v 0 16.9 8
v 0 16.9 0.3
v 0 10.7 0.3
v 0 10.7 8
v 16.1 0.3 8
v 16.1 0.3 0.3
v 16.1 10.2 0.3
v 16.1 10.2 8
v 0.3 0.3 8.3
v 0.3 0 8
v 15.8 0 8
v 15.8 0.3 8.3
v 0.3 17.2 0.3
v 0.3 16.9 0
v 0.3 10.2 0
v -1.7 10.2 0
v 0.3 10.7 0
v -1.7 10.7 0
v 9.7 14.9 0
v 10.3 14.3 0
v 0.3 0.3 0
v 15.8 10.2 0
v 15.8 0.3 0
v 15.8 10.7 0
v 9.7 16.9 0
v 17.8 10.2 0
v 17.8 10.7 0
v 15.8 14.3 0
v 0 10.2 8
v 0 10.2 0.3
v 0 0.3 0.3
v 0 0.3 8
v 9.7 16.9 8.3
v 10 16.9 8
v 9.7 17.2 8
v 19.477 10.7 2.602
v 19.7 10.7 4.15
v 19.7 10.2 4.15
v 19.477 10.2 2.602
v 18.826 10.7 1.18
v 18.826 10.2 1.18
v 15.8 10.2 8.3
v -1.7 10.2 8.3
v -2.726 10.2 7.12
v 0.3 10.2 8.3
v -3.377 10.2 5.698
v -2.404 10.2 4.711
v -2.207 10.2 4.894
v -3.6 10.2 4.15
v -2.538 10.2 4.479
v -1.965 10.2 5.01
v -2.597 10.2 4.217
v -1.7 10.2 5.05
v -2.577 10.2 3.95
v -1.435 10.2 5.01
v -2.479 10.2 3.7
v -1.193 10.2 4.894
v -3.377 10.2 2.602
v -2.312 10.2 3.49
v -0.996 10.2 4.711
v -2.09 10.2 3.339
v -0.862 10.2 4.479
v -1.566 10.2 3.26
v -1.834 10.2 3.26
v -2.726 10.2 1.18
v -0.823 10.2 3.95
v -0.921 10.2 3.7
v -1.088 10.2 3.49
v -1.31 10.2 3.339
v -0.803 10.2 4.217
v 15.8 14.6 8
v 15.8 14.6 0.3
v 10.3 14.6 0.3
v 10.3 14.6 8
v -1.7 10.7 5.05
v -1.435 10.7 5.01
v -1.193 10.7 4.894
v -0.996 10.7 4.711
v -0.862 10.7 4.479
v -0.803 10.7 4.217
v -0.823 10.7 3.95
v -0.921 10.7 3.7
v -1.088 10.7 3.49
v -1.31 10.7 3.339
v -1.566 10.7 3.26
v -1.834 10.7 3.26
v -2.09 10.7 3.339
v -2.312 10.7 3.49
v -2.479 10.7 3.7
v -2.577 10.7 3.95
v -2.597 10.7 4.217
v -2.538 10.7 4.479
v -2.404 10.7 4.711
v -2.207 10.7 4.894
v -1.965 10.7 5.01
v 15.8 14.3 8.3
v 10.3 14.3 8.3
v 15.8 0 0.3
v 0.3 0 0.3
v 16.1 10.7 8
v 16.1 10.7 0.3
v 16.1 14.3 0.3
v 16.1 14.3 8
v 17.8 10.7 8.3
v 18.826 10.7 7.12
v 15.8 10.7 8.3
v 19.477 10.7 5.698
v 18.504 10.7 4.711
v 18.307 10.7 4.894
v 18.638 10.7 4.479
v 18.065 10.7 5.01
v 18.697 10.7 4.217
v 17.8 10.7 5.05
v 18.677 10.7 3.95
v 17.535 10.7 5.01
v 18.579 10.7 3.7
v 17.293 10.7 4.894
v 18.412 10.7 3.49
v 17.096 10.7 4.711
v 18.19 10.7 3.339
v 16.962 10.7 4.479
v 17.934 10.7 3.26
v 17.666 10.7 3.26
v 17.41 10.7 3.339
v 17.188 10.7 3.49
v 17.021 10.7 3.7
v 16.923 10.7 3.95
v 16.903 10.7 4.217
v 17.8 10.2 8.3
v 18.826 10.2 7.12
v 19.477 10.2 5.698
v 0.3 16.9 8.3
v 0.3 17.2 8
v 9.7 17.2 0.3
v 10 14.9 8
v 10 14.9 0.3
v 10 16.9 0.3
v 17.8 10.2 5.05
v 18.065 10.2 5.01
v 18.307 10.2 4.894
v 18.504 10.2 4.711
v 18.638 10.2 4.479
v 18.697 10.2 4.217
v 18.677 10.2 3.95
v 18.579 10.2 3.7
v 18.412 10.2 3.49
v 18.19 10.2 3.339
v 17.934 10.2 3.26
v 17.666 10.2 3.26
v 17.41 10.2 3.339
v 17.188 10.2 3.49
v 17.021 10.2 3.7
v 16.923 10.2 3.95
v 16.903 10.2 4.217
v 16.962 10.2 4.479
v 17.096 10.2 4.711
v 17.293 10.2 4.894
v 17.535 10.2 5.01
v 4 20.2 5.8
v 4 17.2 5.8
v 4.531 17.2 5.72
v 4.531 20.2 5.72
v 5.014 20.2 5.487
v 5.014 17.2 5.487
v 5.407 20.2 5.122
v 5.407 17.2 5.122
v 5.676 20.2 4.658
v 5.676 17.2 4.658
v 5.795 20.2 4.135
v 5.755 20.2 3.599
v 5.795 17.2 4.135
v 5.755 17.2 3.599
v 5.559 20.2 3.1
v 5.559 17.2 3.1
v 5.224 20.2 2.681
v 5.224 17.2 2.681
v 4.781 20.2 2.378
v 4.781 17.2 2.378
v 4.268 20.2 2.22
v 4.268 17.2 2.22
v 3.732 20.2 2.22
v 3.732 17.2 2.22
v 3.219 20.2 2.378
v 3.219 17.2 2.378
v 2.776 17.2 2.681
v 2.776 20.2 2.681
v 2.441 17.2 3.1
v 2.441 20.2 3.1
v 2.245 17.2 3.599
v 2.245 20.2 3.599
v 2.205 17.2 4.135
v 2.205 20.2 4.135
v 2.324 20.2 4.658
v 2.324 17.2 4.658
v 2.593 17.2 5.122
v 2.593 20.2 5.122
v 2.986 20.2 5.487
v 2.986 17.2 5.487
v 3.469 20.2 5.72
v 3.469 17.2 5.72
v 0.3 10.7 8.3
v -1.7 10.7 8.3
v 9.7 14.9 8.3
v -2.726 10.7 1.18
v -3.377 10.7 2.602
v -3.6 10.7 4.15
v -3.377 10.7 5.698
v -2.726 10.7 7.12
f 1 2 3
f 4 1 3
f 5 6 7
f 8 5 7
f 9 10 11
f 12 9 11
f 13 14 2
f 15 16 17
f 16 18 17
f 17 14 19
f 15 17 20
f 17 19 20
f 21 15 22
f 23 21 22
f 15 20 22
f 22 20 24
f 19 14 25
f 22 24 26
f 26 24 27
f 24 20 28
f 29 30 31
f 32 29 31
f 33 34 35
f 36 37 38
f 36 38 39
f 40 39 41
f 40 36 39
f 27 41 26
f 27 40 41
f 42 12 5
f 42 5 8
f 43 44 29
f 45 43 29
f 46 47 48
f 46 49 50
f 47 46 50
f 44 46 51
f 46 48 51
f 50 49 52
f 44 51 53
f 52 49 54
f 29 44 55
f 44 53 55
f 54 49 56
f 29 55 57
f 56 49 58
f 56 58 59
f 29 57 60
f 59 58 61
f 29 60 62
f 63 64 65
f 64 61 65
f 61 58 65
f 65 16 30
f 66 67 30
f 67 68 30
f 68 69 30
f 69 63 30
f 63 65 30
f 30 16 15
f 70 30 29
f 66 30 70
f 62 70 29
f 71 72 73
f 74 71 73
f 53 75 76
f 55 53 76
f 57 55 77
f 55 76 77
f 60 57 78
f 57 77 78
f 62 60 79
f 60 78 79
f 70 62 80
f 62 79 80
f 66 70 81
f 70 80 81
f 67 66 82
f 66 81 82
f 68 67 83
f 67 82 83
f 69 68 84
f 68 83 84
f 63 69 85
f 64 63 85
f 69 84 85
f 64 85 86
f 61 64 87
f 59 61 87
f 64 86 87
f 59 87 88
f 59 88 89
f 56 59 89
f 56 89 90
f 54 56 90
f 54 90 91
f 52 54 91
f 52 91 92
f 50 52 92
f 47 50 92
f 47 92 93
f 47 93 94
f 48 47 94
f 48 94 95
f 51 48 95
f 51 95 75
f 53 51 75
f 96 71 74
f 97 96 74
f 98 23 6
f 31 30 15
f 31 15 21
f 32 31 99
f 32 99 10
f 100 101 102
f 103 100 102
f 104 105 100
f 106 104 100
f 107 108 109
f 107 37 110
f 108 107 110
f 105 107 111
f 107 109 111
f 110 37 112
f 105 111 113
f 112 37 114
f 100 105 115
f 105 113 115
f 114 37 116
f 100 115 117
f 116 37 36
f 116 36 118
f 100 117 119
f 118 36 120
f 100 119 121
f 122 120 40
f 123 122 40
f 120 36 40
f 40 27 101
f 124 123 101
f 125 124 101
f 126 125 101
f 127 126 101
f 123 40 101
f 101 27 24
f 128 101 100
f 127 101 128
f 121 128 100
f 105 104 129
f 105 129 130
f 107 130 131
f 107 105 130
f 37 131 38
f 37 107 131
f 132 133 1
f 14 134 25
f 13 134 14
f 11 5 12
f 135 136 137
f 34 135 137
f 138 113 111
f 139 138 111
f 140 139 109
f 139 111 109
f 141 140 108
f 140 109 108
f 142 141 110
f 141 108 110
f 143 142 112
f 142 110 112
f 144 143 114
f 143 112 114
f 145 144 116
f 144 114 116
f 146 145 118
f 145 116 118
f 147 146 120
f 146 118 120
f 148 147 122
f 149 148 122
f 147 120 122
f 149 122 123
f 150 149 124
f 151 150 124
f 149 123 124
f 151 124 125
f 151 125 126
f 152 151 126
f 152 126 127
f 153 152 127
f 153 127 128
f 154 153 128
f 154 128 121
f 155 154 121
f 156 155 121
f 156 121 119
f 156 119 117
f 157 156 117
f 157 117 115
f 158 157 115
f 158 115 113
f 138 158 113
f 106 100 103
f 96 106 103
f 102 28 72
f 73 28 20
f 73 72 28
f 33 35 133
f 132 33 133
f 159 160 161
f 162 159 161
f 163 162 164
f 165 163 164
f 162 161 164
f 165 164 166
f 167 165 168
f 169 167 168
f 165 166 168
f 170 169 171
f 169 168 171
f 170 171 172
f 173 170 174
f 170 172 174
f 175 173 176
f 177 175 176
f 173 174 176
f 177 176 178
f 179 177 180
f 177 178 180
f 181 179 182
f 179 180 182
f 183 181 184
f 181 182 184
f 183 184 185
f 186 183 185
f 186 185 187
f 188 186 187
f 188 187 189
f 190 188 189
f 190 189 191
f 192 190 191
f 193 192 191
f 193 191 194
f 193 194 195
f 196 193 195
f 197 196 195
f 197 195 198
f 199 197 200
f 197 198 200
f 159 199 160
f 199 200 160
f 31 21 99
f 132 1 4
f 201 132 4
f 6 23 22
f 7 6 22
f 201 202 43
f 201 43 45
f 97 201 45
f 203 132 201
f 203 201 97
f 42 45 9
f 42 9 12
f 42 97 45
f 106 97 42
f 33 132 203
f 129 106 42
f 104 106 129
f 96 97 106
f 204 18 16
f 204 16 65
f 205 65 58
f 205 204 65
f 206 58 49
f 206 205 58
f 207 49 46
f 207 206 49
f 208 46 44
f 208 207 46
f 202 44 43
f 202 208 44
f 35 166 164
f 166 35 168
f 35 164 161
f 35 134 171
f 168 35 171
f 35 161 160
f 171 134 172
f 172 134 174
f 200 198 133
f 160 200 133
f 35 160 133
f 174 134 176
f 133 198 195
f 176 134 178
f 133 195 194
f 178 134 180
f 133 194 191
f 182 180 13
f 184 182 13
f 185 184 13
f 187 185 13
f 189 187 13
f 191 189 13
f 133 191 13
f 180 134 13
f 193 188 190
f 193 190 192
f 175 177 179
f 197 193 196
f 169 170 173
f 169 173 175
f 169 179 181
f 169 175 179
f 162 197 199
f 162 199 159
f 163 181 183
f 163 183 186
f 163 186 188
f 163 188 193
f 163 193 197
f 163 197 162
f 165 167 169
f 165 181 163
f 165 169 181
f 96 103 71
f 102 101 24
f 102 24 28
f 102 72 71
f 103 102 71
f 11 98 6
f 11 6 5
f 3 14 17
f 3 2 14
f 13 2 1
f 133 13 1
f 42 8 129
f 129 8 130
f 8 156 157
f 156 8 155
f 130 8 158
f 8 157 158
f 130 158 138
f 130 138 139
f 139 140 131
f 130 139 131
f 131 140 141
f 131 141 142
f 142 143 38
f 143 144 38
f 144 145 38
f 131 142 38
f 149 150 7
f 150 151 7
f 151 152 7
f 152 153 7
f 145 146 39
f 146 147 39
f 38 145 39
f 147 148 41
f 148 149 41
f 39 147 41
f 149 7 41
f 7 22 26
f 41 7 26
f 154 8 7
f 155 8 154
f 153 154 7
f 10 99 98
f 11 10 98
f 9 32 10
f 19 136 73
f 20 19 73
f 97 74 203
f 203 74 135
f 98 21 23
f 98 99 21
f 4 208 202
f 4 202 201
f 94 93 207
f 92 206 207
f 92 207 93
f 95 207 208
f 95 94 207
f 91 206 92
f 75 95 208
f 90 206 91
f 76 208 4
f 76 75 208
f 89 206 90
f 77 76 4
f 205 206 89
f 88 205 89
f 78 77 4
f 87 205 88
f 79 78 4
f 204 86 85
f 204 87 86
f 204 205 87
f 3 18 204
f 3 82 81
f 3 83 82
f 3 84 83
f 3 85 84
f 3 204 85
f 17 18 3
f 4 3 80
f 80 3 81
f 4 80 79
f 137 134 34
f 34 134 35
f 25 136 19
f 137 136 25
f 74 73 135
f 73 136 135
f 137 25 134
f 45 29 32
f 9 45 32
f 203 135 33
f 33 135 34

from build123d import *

# Parameters (mm, degrees)
EXTRUDE_1_DEPTH     = 8.3
SKETCH_9_R          = 1.8
EXTRUDE_6_DEPTH     = 3
CHAMFER_1_SIZE      = 0.3
EXTRUDE_7_DEPTH     = 0.5
SKETCH_11_R         = 0.9
CUT_EXTRUDE_1_DEPTH = 10


with BuildPart() as part:
    # 草图1 → 凸台-拉伸1 (new body)
    with BuildSketch(Plane.XY):
        Polygon((16.1, 10.2), (17.8, 10.2), (17.8, 10.7), (16.1, 10.7), (16.1, 14.6), (10, 14.6), (10, 17.2), (0, 17.2), (0, 10.7), (-1.7, 10.7), (-1.7, 10.2), (0, 10.2), (0, 0), (16.1, 0), align=None)
    extrude(amount=EXTRUDE_1_DEPTH)

    # 草图9 → 凸台-拉伸6 (add)
    with BuildSketch(Plane(origin=(0, 17.2, 0), x_dir=(1, 0, 0), z_dir=(0, 1, 0))):
        with Locations(Location((4, -4, 0), (0, 0, 270))):
            Circle(SKETCH_9_R)
    extrude(amount=EXTRUDE_6_DEPTH)

    # 倒角1
    chamfer_1_edges = [part.edges().sort_by_distance(p)[0] for p in [
        (8.05, 0, 0),
        (0, 5.1, 0),
        (0, 13.95, 0),
        (5, 17.2, 0),
        (10, 15.9, 0),
        (13.05, 14.6, 0),
        (16.1, 12.65, 0),
        (16.1, 5.1, 0),
        (16.1, 12.65, 8.3),
        (16.1, 0, 4.15),
        (0, 0, 4.15),
        (0, 17.2, 4.15),
        (10, 17.2, 4.15),
        (10, 14.6, 4.15),
        (16.1, 14.6, 4.15),
        (13.05, 14.6, 8.3),
        (10, 15.9, 8.3),
        (5, 17.2, 8.3),
        (0, 13.95, 8.3),
        (16.1, 5.1, 8.3),
        (0, 5.1, 8.3),
        (8.05, 0, 8.3),
    ]]
    chamfer(chamfer_1_edges, length=CHAMFER_1_SIZE)

    # 草图10 → 凸台-拉伸7 (add)
    with BuildSketch(Plane(origin=(0, 10.7, 0), x_dir=(1, 0, 0), z_dir=(0, 1, 0))):
        with BuildLine():
            Line((-1.7, -8.3), (-1.7, 0))
            ThreePointArc((-1.7, 0), (-3.6, -4.15), (-1.7, -8.3))
        make_face()
        with BuildLine():
            ThreePointArc((19.7, -4.15), (19.202419193, -1.867868321), (17.8, 0))
            Line((17.8, 0), (17.8, -8.3))
            ThreePointArc((17.8, -8.3), (19.202419193, -6.432131679), (19.7, -4.15))
        make_face()
    extrude(amount=-EXTRUDE_7_DEPTH)

    # 草图11 → 切除-拉伸1 (cut)
    with BuildSketch(Plane(origin=(0, 10.7, 0), x_dir=(1, 0, 0), z_dir=(0, 1, 0))):
        with Locations(Location((-1.7, -4.15, 0), (0, 0, 270))):
            Circle(SKETCH_11_R)
        with Locations(Location((17.8, -4.15, 0), (0, 0, 270))):
            Circle(SKETCH_11_R)
    extrude(amount=-CUT_EXTRUDE_1_DEPTH, mode=Mode.SUBTRACT)


solid = part.part
